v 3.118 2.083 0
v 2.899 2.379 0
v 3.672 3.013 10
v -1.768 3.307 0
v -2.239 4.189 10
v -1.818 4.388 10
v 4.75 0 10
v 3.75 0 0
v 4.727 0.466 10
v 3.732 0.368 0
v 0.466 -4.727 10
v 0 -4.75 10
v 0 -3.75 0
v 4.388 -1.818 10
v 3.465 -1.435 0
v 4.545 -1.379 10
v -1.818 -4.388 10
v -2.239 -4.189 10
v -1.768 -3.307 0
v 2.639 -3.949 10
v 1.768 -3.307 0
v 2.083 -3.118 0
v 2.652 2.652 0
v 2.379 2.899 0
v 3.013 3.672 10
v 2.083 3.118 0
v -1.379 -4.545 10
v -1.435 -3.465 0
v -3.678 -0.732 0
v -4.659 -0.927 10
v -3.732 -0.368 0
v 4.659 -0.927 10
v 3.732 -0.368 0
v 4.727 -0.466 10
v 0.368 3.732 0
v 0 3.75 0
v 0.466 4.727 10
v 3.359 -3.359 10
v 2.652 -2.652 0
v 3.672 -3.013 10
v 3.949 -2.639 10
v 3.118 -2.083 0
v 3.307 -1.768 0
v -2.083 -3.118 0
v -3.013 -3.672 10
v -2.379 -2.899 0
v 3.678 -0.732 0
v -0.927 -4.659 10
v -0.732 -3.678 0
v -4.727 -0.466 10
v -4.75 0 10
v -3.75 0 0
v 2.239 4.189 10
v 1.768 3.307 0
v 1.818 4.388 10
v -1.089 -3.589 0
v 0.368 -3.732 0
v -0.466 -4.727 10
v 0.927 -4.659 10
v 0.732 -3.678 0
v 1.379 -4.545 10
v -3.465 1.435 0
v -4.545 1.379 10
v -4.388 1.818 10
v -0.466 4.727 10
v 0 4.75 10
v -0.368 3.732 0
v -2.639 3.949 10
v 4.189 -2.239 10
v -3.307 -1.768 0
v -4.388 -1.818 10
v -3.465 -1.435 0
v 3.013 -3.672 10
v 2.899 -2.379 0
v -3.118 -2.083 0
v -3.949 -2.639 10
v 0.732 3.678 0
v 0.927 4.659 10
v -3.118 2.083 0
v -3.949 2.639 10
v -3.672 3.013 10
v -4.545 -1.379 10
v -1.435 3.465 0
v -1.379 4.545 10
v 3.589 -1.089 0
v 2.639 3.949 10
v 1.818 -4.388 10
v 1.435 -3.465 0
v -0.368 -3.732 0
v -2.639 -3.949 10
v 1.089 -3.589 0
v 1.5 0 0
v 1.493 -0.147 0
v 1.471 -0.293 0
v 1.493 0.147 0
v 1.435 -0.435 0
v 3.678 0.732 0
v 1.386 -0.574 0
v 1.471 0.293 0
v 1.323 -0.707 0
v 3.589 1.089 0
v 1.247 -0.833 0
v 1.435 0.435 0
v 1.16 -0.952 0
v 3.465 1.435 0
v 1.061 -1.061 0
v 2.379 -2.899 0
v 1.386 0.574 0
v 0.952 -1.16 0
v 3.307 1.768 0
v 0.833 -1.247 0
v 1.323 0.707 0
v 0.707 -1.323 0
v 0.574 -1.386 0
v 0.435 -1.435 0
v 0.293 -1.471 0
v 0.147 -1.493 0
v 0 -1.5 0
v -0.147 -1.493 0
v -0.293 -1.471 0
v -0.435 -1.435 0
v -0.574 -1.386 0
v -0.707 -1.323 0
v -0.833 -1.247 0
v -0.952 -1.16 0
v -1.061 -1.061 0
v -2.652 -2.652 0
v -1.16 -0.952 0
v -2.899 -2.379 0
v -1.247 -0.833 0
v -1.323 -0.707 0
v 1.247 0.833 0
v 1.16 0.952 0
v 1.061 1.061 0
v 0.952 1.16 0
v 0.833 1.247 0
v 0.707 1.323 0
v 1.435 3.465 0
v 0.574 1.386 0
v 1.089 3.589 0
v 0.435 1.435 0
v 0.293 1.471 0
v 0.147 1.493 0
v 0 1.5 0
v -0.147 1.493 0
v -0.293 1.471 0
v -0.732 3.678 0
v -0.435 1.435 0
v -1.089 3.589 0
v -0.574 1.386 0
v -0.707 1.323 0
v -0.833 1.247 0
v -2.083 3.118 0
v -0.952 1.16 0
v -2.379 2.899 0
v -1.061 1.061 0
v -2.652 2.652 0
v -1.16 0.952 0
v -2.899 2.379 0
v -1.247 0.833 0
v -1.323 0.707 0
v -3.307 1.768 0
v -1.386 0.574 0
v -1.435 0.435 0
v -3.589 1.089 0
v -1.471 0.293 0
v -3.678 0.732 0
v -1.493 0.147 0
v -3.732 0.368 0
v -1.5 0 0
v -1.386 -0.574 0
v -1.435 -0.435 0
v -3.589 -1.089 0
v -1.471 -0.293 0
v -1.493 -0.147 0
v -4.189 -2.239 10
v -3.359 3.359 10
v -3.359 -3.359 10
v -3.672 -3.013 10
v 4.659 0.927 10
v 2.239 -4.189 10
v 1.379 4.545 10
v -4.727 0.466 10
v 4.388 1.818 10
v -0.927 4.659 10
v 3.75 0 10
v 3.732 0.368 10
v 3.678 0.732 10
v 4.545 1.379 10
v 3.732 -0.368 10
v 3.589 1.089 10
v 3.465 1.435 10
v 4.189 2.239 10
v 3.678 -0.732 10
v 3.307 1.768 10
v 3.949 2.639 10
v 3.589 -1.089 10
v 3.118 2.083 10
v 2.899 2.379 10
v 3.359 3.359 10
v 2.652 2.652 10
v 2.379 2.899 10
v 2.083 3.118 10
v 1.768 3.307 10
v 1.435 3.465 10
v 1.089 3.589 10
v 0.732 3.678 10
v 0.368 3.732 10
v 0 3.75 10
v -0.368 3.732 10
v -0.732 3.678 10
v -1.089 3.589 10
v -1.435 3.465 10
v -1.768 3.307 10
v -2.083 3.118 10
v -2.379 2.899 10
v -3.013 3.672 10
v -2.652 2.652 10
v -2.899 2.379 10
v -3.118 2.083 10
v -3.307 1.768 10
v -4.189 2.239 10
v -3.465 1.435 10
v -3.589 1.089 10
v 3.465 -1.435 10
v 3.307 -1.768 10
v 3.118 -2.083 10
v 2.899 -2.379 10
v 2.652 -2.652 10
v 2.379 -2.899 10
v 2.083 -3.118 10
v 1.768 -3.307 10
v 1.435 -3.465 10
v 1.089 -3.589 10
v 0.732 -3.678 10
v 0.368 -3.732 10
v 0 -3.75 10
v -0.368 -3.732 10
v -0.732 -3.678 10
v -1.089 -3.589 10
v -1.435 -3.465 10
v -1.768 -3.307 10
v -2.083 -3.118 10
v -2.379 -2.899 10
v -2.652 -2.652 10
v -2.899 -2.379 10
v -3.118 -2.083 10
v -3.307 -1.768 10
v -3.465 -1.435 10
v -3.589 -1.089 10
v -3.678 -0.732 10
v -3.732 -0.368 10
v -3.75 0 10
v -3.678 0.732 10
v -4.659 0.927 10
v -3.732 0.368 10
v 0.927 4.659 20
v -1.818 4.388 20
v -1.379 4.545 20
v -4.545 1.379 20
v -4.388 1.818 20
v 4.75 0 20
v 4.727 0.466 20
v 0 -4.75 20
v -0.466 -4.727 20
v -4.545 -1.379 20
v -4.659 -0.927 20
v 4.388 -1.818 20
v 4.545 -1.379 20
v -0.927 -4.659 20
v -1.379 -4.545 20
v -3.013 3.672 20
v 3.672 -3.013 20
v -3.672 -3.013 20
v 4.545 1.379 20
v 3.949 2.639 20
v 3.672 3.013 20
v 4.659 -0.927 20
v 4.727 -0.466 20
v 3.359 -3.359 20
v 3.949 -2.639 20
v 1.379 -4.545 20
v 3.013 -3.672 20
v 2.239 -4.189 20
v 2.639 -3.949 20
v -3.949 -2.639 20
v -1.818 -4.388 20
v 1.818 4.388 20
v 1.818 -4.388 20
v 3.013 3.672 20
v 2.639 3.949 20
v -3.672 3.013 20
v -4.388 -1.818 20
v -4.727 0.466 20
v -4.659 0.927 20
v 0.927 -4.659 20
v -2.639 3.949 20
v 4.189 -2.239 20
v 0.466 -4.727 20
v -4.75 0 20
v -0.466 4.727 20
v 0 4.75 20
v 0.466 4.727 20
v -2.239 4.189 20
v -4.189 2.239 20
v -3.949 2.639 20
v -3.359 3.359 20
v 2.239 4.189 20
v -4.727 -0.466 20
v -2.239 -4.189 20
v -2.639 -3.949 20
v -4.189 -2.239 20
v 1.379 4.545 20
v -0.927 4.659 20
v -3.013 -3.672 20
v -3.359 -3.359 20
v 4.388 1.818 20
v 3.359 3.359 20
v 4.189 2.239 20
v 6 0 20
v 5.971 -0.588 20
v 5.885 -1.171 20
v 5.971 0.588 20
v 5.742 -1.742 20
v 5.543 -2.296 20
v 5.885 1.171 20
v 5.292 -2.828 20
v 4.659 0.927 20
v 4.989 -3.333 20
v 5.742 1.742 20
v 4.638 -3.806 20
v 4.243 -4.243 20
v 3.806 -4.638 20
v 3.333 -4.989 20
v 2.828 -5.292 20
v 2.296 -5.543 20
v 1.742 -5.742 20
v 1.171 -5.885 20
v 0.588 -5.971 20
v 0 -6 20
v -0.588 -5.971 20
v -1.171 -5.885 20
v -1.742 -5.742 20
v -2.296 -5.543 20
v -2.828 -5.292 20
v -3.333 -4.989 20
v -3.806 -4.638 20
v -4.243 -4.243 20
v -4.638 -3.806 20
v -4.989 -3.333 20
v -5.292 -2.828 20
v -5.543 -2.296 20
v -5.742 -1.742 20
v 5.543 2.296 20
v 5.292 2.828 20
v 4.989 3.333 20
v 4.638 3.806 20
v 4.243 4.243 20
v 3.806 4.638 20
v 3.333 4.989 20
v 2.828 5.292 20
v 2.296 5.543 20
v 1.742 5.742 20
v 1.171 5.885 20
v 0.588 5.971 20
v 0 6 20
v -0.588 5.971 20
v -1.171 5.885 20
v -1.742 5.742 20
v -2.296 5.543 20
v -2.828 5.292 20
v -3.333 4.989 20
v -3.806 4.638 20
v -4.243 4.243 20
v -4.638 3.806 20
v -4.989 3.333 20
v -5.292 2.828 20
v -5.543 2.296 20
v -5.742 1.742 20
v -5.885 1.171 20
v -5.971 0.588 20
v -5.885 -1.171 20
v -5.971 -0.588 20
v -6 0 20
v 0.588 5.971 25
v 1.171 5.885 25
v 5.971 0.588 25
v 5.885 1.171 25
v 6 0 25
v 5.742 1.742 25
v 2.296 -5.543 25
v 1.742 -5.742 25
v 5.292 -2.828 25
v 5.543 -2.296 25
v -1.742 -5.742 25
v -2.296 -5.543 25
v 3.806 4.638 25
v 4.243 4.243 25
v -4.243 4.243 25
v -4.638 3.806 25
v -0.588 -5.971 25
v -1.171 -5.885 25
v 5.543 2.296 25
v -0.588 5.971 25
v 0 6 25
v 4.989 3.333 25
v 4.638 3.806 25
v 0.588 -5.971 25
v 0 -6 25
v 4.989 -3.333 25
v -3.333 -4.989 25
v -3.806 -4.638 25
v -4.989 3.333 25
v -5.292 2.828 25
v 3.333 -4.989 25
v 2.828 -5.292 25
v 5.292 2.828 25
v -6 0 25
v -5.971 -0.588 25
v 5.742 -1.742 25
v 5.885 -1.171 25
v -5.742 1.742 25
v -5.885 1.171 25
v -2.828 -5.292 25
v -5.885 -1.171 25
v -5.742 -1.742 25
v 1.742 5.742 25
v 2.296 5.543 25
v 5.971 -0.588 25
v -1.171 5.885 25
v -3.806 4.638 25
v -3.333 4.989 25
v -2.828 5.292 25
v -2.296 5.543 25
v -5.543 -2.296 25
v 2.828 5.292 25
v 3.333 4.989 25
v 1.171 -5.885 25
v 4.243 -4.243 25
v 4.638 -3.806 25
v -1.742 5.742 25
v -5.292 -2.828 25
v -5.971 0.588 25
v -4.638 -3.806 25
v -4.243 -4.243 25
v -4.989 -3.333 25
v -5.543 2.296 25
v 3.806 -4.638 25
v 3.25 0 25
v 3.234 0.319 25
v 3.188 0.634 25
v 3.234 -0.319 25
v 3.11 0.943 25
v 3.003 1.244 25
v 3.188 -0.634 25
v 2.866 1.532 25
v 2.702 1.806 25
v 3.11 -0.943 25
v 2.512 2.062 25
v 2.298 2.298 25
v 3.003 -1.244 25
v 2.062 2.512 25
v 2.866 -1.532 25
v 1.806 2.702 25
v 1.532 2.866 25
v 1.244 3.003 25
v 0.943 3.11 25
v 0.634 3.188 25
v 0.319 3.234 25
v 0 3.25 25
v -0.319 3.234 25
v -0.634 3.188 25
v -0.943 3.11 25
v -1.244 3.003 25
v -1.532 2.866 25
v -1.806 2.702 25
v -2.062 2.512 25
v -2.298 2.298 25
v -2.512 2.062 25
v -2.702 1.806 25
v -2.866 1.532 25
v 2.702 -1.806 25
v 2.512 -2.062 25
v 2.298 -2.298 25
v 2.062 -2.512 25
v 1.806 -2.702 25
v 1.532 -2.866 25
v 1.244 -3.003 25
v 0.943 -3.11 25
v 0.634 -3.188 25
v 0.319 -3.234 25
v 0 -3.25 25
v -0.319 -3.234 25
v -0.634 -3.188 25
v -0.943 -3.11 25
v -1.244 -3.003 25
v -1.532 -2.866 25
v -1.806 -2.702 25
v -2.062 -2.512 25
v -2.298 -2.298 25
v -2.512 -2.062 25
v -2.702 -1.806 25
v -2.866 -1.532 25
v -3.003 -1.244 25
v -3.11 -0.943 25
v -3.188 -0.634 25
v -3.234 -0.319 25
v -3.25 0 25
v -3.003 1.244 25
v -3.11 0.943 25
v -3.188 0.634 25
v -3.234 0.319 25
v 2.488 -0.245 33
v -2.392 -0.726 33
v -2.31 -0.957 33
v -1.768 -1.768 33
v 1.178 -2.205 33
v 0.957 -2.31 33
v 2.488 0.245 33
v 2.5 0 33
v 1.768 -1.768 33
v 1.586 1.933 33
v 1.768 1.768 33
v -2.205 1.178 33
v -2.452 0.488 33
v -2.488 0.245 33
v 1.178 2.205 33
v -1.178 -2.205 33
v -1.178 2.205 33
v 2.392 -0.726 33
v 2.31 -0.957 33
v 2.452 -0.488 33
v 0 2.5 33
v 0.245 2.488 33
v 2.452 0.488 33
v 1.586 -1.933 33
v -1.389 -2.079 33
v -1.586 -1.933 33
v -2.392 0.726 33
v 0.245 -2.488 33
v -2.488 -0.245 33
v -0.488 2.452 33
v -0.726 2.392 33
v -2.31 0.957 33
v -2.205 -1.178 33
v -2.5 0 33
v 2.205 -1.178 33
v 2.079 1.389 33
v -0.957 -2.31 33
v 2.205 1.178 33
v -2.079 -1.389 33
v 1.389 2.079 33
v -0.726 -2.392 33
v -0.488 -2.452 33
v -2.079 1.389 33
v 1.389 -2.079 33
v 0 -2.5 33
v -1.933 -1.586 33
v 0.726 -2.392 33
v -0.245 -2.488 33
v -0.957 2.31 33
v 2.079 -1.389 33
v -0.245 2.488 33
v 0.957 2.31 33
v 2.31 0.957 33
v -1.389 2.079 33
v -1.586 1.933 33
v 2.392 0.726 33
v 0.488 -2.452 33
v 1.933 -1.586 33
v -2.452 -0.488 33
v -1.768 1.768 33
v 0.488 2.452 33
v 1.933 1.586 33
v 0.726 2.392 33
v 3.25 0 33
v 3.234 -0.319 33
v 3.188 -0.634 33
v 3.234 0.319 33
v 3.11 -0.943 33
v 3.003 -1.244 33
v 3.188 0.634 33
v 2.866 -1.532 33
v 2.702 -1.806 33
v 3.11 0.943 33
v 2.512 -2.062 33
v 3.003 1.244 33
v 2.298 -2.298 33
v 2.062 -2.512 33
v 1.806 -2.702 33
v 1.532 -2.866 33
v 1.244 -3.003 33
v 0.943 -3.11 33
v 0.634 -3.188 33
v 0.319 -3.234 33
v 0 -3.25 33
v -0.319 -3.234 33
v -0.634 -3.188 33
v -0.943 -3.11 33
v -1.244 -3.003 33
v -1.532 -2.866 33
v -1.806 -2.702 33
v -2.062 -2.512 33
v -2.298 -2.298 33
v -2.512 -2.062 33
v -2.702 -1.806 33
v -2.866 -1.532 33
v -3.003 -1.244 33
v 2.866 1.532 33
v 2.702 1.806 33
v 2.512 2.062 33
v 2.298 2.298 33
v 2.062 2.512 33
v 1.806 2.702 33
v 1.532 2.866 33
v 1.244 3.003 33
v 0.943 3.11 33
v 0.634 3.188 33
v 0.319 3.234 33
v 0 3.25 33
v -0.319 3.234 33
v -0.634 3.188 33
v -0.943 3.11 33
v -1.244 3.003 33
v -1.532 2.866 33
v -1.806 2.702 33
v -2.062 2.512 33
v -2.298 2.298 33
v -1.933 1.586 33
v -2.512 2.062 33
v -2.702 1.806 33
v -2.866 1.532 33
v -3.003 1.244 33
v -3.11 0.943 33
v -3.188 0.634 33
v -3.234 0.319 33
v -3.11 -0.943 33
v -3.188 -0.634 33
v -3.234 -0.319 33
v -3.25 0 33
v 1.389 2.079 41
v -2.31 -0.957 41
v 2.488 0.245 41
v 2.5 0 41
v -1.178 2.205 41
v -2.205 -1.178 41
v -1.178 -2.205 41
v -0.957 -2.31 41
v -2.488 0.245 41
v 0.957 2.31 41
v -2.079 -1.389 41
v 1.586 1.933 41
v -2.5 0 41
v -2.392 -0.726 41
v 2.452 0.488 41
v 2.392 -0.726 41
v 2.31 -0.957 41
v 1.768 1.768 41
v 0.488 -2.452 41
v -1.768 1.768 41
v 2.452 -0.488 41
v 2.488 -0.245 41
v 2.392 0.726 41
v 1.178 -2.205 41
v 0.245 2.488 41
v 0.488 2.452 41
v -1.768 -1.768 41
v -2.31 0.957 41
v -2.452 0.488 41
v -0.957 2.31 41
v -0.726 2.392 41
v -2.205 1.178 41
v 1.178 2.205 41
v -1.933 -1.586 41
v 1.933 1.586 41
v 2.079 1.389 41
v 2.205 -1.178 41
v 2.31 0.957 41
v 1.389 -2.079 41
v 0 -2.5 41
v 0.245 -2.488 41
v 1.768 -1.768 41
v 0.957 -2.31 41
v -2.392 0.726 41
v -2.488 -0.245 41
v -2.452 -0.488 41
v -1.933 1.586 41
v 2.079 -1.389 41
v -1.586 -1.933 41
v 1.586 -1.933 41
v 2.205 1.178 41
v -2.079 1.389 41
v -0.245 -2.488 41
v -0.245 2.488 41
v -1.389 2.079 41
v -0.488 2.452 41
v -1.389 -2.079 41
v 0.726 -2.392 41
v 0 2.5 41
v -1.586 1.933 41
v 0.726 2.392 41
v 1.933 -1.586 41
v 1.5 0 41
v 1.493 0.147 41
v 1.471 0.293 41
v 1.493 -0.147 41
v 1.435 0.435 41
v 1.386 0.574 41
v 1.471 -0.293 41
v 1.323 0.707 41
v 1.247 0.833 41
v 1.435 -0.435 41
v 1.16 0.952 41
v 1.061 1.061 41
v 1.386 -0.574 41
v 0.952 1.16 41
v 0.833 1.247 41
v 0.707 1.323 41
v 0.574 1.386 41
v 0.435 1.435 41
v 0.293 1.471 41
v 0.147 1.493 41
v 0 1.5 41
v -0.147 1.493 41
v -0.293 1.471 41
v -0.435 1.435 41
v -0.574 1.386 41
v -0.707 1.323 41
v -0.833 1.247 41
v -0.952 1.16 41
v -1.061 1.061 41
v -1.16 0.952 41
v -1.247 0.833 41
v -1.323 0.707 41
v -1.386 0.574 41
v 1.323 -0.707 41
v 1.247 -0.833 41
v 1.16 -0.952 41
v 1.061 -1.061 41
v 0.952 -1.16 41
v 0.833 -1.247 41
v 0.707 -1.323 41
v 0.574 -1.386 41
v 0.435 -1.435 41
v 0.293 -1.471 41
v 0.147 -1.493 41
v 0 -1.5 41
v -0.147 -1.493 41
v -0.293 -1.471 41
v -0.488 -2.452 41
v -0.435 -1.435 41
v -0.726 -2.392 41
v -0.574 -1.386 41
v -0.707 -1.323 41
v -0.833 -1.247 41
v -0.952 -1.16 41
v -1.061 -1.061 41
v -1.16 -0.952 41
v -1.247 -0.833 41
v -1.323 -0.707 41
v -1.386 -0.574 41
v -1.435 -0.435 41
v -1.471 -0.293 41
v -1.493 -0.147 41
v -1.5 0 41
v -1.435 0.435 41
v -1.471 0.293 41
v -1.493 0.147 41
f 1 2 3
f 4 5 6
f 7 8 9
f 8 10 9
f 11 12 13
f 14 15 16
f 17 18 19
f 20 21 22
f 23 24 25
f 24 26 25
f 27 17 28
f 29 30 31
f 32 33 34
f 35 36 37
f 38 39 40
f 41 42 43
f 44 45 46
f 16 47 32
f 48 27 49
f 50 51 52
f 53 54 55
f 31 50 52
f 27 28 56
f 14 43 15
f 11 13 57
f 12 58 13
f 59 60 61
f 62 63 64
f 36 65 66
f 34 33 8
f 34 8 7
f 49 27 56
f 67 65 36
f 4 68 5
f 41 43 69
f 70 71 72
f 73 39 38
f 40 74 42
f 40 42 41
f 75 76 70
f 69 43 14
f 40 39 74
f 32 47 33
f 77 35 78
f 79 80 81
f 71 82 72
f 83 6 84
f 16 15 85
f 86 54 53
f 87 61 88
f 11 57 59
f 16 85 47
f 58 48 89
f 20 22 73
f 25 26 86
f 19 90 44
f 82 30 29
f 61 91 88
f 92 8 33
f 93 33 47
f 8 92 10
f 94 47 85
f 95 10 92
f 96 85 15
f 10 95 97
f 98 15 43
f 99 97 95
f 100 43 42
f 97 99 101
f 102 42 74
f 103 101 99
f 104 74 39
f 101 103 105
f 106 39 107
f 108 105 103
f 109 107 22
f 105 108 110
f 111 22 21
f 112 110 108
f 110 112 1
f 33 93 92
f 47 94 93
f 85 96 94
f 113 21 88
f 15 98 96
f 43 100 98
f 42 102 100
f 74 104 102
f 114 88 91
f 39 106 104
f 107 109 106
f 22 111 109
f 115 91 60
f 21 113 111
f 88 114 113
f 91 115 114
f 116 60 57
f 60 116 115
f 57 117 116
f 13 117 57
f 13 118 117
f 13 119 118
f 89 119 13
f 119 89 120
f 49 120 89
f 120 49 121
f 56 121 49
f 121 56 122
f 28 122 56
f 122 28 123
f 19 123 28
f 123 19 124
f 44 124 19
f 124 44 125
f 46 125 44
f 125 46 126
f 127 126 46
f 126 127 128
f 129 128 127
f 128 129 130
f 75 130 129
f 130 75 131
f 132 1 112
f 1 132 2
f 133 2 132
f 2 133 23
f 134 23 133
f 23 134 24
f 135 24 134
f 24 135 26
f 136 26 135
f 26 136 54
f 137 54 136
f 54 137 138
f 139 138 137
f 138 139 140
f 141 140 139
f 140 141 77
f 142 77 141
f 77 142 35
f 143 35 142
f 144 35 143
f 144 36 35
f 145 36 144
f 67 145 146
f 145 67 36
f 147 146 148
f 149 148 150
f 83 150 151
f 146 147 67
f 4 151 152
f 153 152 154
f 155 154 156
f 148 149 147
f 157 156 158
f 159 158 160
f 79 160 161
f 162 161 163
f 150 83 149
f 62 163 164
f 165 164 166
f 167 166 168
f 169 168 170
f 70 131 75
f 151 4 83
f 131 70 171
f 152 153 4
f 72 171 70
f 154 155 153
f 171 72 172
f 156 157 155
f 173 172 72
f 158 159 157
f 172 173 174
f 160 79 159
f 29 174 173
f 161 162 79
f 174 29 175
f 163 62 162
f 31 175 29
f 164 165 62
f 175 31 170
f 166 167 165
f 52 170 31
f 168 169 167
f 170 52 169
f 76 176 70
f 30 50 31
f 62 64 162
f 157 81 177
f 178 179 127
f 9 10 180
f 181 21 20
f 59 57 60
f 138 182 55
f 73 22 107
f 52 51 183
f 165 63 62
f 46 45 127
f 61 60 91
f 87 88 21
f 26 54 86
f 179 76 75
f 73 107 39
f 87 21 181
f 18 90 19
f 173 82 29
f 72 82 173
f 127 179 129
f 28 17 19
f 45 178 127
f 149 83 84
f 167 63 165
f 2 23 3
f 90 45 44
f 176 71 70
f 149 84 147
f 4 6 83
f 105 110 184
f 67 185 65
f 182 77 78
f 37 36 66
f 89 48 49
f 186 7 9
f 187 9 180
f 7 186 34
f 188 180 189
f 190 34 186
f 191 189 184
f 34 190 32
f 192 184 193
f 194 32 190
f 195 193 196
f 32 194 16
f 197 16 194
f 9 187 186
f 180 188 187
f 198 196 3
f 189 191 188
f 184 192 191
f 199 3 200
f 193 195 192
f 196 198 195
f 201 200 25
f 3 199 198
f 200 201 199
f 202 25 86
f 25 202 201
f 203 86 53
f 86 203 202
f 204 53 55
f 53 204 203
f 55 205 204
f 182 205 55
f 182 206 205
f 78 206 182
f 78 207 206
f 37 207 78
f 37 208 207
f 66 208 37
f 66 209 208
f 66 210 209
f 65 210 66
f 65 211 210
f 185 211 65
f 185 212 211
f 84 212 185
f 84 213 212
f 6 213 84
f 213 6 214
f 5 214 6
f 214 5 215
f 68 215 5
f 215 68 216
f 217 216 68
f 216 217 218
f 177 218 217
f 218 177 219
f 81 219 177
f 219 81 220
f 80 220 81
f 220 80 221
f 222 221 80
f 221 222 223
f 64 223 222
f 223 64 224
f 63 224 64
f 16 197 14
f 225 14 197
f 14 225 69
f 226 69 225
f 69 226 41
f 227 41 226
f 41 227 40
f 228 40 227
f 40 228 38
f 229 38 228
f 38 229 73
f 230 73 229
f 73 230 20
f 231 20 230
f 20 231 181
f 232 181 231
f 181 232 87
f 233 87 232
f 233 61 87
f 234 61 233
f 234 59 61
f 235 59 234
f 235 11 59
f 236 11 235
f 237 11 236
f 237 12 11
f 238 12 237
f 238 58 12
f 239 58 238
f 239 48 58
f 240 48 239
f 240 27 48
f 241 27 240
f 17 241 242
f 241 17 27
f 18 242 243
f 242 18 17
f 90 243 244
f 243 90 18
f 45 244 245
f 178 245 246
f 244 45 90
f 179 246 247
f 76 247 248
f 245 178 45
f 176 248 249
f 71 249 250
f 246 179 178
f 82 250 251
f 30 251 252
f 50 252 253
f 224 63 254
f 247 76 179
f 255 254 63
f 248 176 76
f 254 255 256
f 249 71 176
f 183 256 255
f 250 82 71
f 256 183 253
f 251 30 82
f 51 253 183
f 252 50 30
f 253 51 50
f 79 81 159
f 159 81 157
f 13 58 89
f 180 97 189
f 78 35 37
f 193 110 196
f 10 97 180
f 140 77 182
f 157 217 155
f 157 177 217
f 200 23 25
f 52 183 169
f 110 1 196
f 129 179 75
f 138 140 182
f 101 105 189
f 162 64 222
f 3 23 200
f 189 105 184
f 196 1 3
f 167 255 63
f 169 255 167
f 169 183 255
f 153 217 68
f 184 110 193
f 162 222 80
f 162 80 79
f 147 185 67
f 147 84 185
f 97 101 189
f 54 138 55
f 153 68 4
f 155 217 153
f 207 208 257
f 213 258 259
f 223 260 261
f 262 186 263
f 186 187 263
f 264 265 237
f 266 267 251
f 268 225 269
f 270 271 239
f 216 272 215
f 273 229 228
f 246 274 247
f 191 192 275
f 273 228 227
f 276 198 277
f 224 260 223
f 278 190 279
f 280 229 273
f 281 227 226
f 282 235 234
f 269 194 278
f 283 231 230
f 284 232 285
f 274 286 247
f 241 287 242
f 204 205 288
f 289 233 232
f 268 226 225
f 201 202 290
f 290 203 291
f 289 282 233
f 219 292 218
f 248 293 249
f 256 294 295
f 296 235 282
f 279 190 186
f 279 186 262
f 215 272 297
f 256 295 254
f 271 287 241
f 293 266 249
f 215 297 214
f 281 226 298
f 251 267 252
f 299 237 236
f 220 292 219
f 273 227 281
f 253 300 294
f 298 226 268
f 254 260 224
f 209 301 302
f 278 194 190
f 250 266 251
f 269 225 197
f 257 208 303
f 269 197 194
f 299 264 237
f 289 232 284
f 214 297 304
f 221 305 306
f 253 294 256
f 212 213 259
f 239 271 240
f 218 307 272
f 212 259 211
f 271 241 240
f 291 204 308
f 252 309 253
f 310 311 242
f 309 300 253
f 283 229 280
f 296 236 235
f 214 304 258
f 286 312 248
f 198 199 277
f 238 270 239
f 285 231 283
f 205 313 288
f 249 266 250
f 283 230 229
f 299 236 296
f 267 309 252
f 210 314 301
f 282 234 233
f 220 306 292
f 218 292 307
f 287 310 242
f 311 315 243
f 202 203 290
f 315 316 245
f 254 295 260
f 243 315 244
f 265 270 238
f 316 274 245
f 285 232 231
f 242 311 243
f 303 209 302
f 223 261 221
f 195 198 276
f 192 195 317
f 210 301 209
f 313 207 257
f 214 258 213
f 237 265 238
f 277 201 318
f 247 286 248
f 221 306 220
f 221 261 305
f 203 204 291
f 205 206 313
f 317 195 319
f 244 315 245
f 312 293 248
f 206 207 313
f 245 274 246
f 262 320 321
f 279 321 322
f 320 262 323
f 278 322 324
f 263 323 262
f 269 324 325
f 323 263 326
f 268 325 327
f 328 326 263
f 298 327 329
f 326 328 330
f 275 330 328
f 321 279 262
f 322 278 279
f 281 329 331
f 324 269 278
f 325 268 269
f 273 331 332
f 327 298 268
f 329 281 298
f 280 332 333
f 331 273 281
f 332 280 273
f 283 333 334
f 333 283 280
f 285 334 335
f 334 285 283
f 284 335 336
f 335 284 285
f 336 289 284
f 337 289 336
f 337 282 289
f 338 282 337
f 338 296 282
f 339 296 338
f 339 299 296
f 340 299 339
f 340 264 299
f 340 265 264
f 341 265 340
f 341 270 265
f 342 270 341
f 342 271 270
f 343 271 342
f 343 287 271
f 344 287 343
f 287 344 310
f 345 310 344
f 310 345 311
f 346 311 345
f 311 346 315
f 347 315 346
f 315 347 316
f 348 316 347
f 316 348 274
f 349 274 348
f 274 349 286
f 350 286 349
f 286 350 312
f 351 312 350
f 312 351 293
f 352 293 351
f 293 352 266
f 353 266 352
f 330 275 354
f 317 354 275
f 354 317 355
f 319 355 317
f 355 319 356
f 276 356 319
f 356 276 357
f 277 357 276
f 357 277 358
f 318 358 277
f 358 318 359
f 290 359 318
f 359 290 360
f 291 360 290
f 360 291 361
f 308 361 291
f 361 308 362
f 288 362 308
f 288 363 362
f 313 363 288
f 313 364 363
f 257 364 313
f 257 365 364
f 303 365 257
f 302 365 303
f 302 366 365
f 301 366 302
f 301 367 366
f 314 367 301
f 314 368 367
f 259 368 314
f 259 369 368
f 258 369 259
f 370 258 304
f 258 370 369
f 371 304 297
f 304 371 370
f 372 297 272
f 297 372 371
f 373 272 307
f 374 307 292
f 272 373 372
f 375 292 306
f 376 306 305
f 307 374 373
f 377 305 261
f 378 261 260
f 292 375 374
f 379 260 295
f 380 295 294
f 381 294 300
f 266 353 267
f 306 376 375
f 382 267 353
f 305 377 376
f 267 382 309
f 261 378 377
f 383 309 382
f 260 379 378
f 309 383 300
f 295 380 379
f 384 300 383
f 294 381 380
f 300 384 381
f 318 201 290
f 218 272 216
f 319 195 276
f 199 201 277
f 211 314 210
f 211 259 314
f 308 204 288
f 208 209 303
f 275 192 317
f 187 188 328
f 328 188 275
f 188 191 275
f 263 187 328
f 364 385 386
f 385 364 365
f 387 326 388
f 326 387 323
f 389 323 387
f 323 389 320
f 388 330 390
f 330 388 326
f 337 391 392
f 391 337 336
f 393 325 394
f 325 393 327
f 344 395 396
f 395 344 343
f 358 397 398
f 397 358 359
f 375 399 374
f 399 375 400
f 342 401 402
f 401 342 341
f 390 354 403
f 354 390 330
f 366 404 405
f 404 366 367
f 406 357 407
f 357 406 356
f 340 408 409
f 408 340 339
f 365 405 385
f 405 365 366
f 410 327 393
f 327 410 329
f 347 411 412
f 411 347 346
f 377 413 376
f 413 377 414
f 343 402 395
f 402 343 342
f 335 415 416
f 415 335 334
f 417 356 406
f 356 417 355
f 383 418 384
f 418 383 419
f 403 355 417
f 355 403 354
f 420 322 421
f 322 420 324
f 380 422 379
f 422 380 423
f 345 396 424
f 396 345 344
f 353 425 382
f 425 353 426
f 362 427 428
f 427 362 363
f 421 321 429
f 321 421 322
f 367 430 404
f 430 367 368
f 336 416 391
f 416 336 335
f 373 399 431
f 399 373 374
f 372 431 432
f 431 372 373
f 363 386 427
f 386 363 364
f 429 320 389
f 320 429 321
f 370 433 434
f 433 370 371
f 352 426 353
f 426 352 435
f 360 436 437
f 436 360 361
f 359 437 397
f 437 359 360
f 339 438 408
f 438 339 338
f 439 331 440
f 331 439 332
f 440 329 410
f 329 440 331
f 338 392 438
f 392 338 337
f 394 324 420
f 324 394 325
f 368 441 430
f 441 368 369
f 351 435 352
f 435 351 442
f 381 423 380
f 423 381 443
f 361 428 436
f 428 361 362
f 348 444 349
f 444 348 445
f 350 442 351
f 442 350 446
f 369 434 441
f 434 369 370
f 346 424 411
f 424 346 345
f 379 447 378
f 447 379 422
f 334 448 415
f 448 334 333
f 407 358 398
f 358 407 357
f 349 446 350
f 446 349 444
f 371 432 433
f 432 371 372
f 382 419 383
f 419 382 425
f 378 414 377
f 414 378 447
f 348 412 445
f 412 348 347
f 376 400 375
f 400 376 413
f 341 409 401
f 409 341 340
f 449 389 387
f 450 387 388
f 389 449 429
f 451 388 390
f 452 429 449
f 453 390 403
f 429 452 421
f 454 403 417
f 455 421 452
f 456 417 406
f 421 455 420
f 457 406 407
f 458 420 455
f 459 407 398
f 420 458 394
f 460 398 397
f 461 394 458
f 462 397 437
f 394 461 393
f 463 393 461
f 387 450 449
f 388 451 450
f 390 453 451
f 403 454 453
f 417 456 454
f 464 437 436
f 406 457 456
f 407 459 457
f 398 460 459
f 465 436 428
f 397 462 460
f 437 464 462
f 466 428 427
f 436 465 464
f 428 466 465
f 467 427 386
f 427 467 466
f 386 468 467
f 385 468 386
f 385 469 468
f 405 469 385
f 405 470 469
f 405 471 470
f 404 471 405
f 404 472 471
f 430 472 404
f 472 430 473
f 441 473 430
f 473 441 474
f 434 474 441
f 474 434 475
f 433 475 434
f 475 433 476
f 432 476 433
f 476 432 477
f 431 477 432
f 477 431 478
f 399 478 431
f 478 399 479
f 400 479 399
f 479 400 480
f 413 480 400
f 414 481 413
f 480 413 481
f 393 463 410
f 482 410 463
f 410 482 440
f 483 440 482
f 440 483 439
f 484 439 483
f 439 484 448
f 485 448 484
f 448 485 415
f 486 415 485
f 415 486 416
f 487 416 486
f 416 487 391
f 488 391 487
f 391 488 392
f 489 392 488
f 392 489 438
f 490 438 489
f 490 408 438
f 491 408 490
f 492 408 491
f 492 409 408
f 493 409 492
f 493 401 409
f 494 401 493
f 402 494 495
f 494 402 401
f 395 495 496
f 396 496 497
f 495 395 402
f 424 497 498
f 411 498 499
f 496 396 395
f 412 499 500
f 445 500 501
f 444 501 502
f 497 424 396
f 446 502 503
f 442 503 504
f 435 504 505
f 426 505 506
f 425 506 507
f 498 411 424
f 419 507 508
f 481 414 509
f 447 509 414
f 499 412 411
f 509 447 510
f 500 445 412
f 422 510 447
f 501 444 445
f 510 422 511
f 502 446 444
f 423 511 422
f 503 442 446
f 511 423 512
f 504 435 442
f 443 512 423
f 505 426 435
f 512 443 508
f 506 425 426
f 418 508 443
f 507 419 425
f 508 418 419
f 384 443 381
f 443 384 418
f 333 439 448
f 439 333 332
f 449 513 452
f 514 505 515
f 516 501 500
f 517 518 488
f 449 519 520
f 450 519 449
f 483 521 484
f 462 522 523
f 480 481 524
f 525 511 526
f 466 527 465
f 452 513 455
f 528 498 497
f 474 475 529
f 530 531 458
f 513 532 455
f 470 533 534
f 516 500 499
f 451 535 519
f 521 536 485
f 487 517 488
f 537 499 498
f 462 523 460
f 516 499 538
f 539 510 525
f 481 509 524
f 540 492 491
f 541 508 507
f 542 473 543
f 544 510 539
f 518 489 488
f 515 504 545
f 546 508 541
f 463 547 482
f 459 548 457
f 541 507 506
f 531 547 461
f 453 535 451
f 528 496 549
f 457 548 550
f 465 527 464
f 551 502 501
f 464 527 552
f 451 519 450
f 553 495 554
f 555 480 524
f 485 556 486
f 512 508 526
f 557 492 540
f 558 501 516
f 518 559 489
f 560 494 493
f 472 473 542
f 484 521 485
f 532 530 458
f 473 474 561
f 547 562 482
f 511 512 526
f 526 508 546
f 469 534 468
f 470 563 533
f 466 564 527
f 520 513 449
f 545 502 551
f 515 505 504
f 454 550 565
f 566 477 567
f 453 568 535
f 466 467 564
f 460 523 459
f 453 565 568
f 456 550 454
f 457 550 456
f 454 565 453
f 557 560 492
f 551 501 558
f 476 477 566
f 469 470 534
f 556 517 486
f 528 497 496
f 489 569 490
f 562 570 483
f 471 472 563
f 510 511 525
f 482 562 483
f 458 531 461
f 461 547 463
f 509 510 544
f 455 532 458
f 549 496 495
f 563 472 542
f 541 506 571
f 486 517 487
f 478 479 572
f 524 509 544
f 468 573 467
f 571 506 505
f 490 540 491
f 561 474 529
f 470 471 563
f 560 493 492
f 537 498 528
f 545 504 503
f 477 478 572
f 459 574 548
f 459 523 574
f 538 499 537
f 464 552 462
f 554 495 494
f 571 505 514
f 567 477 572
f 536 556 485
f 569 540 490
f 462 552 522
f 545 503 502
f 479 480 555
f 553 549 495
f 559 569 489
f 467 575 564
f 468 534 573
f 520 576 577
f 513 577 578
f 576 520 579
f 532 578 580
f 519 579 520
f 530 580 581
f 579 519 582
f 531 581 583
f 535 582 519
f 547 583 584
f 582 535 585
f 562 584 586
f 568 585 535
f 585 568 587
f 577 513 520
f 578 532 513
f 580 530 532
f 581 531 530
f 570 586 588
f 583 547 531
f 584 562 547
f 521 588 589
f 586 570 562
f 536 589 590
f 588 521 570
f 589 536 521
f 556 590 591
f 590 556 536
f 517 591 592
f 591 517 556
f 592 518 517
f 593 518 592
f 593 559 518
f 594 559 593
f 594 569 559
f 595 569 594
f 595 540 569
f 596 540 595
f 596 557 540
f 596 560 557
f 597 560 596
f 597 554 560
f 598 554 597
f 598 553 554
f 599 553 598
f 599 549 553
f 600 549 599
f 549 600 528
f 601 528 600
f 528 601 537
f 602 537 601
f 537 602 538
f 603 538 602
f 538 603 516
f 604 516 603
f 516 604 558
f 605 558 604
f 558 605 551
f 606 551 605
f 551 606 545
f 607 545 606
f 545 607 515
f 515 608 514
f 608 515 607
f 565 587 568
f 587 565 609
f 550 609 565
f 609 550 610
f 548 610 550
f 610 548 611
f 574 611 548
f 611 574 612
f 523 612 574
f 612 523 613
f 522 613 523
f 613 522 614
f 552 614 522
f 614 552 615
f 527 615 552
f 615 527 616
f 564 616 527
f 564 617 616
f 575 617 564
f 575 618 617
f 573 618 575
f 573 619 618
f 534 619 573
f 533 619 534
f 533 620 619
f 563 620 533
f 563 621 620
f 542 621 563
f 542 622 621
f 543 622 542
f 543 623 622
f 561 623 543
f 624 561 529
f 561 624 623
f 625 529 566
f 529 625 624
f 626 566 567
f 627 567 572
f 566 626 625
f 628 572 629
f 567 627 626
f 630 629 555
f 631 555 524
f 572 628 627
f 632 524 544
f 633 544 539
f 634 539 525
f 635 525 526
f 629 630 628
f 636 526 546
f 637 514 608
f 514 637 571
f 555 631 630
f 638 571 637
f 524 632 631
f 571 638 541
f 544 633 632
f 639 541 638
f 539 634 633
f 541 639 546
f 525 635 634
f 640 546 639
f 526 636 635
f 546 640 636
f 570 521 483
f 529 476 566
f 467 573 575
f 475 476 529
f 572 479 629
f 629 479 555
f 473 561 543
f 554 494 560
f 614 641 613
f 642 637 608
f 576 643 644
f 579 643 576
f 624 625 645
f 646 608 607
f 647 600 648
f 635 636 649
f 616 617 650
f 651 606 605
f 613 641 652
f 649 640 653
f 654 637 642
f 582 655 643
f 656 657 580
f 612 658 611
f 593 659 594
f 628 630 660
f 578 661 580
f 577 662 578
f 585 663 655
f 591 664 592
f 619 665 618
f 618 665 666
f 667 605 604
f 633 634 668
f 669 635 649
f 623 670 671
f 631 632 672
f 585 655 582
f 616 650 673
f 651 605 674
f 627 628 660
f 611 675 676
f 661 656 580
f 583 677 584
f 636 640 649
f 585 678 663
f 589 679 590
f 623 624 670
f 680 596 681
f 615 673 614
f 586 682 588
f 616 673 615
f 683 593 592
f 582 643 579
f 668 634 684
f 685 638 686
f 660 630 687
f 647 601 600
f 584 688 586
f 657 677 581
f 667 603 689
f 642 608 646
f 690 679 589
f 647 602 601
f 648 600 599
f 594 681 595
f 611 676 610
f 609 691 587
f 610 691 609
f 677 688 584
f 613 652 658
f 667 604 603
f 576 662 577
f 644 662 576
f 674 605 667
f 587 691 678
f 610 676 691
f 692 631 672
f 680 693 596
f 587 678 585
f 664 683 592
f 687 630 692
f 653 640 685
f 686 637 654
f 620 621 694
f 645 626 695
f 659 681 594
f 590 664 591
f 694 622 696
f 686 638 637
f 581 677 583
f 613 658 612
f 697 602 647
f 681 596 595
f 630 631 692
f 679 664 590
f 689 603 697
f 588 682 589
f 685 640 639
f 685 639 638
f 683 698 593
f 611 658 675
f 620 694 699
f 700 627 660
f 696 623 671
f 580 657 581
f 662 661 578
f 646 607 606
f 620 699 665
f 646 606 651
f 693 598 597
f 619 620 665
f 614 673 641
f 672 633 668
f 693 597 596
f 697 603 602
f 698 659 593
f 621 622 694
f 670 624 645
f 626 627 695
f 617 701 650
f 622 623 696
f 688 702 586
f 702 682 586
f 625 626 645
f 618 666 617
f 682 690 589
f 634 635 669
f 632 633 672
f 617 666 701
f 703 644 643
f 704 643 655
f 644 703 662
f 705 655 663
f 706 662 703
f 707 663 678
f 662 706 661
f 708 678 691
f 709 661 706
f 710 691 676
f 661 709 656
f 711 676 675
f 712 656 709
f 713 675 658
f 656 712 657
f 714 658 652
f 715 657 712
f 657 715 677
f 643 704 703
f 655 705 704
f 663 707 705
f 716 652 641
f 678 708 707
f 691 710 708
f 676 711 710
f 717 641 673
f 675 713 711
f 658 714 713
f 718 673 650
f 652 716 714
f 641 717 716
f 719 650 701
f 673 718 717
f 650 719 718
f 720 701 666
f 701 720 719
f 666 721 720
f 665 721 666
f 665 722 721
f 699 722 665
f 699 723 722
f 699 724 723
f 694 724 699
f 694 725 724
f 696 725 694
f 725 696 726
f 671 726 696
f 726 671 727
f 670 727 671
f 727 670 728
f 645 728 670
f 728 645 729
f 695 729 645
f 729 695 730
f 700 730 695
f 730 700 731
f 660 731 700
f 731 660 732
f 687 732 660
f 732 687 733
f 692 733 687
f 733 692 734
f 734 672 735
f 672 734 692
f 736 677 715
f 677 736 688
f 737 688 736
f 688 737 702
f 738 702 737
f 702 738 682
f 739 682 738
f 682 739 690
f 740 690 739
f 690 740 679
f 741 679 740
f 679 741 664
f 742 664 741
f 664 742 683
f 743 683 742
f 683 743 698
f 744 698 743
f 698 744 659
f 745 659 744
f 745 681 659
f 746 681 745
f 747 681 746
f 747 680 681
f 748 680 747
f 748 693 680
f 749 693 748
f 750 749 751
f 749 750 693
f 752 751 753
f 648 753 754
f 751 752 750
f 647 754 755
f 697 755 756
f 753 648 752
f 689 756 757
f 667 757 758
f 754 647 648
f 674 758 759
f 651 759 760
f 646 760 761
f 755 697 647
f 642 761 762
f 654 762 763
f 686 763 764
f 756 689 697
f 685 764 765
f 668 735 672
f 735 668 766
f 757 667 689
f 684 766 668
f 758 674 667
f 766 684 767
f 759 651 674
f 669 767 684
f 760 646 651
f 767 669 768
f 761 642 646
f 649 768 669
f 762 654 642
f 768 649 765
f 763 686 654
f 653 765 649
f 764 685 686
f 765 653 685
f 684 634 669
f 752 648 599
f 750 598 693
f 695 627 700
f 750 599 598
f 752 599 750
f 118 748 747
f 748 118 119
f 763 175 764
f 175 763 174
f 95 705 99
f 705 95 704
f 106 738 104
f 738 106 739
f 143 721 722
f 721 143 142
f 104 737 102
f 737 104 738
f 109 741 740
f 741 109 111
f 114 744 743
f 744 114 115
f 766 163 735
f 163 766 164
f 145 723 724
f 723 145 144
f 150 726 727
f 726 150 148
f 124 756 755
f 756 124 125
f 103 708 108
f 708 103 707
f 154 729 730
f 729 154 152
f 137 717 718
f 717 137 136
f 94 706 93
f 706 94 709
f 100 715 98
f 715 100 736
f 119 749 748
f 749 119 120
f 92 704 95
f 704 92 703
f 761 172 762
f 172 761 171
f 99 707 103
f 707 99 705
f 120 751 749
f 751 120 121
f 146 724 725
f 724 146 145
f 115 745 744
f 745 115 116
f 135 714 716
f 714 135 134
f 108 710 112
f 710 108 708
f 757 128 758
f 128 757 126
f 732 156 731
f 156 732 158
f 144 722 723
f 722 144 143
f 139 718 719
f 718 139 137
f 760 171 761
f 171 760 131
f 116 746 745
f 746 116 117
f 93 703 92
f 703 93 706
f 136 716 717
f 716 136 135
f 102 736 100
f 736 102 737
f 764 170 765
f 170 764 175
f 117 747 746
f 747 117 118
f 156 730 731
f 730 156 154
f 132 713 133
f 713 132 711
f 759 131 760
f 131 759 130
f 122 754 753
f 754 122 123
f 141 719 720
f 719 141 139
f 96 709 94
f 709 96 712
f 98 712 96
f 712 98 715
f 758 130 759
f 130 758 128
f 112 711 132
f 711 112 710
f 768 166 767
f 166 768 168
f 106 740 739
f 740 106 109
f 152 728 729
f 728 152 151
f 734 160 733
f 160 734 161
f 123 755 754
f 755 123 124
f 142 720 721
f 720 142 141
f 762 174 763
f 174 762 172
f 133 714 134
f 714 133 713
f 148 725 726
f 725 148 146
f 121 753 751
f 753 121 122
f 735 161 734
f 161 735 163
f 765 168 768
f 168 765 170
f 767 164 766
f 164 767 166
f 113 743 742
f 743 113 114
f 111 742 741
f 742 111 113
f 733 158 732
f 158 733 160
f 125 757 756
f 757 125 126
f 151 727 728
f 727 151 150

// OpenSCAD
// Straight hose-barb reducer
// Designed for 8mm and 5mm ID silicone tubing with a 3mm central bore.
// Corrected for watertight manifold geometry and full height.

// --- Dimensions ---
bore_d = 3.0;           // Central bore diameter
total_h = 41.0;         // Total height of the part

// 8mm side (z = 0 to 20)
barb8_h = 10.0;         // Height of one 8mm barb
barb8_d_base = 7.5;     // Bottom diameter of 8mm barb
barb8_d_top = 9.5;      // Top diameter of 8mm barb

// Collar (z = 20 to 25)
collar_h = 5.0;         // Height of the transition collar
collar_d = 12.0;        // Diameter of the transition collar

// 5mm side (z = 25 to 41)
barb5_h = 8.0;          // Height of one 5mm barb
barb5_d_base = 6.5;     // Bottom diameter of 5mm barb
barb5_d_top = 5.0;      // Top diameter of 5mm barb

$fn = 64;

// --- Modules ---

// A single barb module using a frustum (cone) to ensure watertightness
// We use a cylinder with d1 and d2 to create the tapered shape
module barb_segment(h, d_bottom, d_top) {
    cylinder(h = h, d1 = d_bottom, d2 = d_top);
}

// --- Main Construction ---

difference() {
    union() {
        // 8mm Barb Section (z = 0 to 20)
        // First barb: z = 0 to 10
        barb_segment(barb8_h, barb8_d_base, barb8_d_top);
        // Second barb: z = 10 to 20
        translate([0, 0, barb8_h]) 
            barb_segment(barb8_h, barb8_d_base, barb8_d_top);

        // Transition Collar (z = 20 to 25)
        translate([0, 0, 20]) 
            cylinder(h = collar_h, d = collar_d);

        // 5mm Barb Section (z = 25 to 41)
        // First barb: z = 25 to 33
        translate([0, 0, 25]) 
            barb_segment(barb5_h, barb5_d_base, barb5_d_top);
        // Second barb: z = 33 to 41
        translate([0, 0, 25 + barb5_h]) 
            barb_segment(barb5_h, barb5_d_base, barb5_d_top);
    }

    // Central Bore (runs through full length)
    // We extend the cylinder slightly to ensure it cuts through the top and bottom faces
    translate([0, 0, -1]) 
        cylinder(h = total_h + 2, d = bore_d);
}
